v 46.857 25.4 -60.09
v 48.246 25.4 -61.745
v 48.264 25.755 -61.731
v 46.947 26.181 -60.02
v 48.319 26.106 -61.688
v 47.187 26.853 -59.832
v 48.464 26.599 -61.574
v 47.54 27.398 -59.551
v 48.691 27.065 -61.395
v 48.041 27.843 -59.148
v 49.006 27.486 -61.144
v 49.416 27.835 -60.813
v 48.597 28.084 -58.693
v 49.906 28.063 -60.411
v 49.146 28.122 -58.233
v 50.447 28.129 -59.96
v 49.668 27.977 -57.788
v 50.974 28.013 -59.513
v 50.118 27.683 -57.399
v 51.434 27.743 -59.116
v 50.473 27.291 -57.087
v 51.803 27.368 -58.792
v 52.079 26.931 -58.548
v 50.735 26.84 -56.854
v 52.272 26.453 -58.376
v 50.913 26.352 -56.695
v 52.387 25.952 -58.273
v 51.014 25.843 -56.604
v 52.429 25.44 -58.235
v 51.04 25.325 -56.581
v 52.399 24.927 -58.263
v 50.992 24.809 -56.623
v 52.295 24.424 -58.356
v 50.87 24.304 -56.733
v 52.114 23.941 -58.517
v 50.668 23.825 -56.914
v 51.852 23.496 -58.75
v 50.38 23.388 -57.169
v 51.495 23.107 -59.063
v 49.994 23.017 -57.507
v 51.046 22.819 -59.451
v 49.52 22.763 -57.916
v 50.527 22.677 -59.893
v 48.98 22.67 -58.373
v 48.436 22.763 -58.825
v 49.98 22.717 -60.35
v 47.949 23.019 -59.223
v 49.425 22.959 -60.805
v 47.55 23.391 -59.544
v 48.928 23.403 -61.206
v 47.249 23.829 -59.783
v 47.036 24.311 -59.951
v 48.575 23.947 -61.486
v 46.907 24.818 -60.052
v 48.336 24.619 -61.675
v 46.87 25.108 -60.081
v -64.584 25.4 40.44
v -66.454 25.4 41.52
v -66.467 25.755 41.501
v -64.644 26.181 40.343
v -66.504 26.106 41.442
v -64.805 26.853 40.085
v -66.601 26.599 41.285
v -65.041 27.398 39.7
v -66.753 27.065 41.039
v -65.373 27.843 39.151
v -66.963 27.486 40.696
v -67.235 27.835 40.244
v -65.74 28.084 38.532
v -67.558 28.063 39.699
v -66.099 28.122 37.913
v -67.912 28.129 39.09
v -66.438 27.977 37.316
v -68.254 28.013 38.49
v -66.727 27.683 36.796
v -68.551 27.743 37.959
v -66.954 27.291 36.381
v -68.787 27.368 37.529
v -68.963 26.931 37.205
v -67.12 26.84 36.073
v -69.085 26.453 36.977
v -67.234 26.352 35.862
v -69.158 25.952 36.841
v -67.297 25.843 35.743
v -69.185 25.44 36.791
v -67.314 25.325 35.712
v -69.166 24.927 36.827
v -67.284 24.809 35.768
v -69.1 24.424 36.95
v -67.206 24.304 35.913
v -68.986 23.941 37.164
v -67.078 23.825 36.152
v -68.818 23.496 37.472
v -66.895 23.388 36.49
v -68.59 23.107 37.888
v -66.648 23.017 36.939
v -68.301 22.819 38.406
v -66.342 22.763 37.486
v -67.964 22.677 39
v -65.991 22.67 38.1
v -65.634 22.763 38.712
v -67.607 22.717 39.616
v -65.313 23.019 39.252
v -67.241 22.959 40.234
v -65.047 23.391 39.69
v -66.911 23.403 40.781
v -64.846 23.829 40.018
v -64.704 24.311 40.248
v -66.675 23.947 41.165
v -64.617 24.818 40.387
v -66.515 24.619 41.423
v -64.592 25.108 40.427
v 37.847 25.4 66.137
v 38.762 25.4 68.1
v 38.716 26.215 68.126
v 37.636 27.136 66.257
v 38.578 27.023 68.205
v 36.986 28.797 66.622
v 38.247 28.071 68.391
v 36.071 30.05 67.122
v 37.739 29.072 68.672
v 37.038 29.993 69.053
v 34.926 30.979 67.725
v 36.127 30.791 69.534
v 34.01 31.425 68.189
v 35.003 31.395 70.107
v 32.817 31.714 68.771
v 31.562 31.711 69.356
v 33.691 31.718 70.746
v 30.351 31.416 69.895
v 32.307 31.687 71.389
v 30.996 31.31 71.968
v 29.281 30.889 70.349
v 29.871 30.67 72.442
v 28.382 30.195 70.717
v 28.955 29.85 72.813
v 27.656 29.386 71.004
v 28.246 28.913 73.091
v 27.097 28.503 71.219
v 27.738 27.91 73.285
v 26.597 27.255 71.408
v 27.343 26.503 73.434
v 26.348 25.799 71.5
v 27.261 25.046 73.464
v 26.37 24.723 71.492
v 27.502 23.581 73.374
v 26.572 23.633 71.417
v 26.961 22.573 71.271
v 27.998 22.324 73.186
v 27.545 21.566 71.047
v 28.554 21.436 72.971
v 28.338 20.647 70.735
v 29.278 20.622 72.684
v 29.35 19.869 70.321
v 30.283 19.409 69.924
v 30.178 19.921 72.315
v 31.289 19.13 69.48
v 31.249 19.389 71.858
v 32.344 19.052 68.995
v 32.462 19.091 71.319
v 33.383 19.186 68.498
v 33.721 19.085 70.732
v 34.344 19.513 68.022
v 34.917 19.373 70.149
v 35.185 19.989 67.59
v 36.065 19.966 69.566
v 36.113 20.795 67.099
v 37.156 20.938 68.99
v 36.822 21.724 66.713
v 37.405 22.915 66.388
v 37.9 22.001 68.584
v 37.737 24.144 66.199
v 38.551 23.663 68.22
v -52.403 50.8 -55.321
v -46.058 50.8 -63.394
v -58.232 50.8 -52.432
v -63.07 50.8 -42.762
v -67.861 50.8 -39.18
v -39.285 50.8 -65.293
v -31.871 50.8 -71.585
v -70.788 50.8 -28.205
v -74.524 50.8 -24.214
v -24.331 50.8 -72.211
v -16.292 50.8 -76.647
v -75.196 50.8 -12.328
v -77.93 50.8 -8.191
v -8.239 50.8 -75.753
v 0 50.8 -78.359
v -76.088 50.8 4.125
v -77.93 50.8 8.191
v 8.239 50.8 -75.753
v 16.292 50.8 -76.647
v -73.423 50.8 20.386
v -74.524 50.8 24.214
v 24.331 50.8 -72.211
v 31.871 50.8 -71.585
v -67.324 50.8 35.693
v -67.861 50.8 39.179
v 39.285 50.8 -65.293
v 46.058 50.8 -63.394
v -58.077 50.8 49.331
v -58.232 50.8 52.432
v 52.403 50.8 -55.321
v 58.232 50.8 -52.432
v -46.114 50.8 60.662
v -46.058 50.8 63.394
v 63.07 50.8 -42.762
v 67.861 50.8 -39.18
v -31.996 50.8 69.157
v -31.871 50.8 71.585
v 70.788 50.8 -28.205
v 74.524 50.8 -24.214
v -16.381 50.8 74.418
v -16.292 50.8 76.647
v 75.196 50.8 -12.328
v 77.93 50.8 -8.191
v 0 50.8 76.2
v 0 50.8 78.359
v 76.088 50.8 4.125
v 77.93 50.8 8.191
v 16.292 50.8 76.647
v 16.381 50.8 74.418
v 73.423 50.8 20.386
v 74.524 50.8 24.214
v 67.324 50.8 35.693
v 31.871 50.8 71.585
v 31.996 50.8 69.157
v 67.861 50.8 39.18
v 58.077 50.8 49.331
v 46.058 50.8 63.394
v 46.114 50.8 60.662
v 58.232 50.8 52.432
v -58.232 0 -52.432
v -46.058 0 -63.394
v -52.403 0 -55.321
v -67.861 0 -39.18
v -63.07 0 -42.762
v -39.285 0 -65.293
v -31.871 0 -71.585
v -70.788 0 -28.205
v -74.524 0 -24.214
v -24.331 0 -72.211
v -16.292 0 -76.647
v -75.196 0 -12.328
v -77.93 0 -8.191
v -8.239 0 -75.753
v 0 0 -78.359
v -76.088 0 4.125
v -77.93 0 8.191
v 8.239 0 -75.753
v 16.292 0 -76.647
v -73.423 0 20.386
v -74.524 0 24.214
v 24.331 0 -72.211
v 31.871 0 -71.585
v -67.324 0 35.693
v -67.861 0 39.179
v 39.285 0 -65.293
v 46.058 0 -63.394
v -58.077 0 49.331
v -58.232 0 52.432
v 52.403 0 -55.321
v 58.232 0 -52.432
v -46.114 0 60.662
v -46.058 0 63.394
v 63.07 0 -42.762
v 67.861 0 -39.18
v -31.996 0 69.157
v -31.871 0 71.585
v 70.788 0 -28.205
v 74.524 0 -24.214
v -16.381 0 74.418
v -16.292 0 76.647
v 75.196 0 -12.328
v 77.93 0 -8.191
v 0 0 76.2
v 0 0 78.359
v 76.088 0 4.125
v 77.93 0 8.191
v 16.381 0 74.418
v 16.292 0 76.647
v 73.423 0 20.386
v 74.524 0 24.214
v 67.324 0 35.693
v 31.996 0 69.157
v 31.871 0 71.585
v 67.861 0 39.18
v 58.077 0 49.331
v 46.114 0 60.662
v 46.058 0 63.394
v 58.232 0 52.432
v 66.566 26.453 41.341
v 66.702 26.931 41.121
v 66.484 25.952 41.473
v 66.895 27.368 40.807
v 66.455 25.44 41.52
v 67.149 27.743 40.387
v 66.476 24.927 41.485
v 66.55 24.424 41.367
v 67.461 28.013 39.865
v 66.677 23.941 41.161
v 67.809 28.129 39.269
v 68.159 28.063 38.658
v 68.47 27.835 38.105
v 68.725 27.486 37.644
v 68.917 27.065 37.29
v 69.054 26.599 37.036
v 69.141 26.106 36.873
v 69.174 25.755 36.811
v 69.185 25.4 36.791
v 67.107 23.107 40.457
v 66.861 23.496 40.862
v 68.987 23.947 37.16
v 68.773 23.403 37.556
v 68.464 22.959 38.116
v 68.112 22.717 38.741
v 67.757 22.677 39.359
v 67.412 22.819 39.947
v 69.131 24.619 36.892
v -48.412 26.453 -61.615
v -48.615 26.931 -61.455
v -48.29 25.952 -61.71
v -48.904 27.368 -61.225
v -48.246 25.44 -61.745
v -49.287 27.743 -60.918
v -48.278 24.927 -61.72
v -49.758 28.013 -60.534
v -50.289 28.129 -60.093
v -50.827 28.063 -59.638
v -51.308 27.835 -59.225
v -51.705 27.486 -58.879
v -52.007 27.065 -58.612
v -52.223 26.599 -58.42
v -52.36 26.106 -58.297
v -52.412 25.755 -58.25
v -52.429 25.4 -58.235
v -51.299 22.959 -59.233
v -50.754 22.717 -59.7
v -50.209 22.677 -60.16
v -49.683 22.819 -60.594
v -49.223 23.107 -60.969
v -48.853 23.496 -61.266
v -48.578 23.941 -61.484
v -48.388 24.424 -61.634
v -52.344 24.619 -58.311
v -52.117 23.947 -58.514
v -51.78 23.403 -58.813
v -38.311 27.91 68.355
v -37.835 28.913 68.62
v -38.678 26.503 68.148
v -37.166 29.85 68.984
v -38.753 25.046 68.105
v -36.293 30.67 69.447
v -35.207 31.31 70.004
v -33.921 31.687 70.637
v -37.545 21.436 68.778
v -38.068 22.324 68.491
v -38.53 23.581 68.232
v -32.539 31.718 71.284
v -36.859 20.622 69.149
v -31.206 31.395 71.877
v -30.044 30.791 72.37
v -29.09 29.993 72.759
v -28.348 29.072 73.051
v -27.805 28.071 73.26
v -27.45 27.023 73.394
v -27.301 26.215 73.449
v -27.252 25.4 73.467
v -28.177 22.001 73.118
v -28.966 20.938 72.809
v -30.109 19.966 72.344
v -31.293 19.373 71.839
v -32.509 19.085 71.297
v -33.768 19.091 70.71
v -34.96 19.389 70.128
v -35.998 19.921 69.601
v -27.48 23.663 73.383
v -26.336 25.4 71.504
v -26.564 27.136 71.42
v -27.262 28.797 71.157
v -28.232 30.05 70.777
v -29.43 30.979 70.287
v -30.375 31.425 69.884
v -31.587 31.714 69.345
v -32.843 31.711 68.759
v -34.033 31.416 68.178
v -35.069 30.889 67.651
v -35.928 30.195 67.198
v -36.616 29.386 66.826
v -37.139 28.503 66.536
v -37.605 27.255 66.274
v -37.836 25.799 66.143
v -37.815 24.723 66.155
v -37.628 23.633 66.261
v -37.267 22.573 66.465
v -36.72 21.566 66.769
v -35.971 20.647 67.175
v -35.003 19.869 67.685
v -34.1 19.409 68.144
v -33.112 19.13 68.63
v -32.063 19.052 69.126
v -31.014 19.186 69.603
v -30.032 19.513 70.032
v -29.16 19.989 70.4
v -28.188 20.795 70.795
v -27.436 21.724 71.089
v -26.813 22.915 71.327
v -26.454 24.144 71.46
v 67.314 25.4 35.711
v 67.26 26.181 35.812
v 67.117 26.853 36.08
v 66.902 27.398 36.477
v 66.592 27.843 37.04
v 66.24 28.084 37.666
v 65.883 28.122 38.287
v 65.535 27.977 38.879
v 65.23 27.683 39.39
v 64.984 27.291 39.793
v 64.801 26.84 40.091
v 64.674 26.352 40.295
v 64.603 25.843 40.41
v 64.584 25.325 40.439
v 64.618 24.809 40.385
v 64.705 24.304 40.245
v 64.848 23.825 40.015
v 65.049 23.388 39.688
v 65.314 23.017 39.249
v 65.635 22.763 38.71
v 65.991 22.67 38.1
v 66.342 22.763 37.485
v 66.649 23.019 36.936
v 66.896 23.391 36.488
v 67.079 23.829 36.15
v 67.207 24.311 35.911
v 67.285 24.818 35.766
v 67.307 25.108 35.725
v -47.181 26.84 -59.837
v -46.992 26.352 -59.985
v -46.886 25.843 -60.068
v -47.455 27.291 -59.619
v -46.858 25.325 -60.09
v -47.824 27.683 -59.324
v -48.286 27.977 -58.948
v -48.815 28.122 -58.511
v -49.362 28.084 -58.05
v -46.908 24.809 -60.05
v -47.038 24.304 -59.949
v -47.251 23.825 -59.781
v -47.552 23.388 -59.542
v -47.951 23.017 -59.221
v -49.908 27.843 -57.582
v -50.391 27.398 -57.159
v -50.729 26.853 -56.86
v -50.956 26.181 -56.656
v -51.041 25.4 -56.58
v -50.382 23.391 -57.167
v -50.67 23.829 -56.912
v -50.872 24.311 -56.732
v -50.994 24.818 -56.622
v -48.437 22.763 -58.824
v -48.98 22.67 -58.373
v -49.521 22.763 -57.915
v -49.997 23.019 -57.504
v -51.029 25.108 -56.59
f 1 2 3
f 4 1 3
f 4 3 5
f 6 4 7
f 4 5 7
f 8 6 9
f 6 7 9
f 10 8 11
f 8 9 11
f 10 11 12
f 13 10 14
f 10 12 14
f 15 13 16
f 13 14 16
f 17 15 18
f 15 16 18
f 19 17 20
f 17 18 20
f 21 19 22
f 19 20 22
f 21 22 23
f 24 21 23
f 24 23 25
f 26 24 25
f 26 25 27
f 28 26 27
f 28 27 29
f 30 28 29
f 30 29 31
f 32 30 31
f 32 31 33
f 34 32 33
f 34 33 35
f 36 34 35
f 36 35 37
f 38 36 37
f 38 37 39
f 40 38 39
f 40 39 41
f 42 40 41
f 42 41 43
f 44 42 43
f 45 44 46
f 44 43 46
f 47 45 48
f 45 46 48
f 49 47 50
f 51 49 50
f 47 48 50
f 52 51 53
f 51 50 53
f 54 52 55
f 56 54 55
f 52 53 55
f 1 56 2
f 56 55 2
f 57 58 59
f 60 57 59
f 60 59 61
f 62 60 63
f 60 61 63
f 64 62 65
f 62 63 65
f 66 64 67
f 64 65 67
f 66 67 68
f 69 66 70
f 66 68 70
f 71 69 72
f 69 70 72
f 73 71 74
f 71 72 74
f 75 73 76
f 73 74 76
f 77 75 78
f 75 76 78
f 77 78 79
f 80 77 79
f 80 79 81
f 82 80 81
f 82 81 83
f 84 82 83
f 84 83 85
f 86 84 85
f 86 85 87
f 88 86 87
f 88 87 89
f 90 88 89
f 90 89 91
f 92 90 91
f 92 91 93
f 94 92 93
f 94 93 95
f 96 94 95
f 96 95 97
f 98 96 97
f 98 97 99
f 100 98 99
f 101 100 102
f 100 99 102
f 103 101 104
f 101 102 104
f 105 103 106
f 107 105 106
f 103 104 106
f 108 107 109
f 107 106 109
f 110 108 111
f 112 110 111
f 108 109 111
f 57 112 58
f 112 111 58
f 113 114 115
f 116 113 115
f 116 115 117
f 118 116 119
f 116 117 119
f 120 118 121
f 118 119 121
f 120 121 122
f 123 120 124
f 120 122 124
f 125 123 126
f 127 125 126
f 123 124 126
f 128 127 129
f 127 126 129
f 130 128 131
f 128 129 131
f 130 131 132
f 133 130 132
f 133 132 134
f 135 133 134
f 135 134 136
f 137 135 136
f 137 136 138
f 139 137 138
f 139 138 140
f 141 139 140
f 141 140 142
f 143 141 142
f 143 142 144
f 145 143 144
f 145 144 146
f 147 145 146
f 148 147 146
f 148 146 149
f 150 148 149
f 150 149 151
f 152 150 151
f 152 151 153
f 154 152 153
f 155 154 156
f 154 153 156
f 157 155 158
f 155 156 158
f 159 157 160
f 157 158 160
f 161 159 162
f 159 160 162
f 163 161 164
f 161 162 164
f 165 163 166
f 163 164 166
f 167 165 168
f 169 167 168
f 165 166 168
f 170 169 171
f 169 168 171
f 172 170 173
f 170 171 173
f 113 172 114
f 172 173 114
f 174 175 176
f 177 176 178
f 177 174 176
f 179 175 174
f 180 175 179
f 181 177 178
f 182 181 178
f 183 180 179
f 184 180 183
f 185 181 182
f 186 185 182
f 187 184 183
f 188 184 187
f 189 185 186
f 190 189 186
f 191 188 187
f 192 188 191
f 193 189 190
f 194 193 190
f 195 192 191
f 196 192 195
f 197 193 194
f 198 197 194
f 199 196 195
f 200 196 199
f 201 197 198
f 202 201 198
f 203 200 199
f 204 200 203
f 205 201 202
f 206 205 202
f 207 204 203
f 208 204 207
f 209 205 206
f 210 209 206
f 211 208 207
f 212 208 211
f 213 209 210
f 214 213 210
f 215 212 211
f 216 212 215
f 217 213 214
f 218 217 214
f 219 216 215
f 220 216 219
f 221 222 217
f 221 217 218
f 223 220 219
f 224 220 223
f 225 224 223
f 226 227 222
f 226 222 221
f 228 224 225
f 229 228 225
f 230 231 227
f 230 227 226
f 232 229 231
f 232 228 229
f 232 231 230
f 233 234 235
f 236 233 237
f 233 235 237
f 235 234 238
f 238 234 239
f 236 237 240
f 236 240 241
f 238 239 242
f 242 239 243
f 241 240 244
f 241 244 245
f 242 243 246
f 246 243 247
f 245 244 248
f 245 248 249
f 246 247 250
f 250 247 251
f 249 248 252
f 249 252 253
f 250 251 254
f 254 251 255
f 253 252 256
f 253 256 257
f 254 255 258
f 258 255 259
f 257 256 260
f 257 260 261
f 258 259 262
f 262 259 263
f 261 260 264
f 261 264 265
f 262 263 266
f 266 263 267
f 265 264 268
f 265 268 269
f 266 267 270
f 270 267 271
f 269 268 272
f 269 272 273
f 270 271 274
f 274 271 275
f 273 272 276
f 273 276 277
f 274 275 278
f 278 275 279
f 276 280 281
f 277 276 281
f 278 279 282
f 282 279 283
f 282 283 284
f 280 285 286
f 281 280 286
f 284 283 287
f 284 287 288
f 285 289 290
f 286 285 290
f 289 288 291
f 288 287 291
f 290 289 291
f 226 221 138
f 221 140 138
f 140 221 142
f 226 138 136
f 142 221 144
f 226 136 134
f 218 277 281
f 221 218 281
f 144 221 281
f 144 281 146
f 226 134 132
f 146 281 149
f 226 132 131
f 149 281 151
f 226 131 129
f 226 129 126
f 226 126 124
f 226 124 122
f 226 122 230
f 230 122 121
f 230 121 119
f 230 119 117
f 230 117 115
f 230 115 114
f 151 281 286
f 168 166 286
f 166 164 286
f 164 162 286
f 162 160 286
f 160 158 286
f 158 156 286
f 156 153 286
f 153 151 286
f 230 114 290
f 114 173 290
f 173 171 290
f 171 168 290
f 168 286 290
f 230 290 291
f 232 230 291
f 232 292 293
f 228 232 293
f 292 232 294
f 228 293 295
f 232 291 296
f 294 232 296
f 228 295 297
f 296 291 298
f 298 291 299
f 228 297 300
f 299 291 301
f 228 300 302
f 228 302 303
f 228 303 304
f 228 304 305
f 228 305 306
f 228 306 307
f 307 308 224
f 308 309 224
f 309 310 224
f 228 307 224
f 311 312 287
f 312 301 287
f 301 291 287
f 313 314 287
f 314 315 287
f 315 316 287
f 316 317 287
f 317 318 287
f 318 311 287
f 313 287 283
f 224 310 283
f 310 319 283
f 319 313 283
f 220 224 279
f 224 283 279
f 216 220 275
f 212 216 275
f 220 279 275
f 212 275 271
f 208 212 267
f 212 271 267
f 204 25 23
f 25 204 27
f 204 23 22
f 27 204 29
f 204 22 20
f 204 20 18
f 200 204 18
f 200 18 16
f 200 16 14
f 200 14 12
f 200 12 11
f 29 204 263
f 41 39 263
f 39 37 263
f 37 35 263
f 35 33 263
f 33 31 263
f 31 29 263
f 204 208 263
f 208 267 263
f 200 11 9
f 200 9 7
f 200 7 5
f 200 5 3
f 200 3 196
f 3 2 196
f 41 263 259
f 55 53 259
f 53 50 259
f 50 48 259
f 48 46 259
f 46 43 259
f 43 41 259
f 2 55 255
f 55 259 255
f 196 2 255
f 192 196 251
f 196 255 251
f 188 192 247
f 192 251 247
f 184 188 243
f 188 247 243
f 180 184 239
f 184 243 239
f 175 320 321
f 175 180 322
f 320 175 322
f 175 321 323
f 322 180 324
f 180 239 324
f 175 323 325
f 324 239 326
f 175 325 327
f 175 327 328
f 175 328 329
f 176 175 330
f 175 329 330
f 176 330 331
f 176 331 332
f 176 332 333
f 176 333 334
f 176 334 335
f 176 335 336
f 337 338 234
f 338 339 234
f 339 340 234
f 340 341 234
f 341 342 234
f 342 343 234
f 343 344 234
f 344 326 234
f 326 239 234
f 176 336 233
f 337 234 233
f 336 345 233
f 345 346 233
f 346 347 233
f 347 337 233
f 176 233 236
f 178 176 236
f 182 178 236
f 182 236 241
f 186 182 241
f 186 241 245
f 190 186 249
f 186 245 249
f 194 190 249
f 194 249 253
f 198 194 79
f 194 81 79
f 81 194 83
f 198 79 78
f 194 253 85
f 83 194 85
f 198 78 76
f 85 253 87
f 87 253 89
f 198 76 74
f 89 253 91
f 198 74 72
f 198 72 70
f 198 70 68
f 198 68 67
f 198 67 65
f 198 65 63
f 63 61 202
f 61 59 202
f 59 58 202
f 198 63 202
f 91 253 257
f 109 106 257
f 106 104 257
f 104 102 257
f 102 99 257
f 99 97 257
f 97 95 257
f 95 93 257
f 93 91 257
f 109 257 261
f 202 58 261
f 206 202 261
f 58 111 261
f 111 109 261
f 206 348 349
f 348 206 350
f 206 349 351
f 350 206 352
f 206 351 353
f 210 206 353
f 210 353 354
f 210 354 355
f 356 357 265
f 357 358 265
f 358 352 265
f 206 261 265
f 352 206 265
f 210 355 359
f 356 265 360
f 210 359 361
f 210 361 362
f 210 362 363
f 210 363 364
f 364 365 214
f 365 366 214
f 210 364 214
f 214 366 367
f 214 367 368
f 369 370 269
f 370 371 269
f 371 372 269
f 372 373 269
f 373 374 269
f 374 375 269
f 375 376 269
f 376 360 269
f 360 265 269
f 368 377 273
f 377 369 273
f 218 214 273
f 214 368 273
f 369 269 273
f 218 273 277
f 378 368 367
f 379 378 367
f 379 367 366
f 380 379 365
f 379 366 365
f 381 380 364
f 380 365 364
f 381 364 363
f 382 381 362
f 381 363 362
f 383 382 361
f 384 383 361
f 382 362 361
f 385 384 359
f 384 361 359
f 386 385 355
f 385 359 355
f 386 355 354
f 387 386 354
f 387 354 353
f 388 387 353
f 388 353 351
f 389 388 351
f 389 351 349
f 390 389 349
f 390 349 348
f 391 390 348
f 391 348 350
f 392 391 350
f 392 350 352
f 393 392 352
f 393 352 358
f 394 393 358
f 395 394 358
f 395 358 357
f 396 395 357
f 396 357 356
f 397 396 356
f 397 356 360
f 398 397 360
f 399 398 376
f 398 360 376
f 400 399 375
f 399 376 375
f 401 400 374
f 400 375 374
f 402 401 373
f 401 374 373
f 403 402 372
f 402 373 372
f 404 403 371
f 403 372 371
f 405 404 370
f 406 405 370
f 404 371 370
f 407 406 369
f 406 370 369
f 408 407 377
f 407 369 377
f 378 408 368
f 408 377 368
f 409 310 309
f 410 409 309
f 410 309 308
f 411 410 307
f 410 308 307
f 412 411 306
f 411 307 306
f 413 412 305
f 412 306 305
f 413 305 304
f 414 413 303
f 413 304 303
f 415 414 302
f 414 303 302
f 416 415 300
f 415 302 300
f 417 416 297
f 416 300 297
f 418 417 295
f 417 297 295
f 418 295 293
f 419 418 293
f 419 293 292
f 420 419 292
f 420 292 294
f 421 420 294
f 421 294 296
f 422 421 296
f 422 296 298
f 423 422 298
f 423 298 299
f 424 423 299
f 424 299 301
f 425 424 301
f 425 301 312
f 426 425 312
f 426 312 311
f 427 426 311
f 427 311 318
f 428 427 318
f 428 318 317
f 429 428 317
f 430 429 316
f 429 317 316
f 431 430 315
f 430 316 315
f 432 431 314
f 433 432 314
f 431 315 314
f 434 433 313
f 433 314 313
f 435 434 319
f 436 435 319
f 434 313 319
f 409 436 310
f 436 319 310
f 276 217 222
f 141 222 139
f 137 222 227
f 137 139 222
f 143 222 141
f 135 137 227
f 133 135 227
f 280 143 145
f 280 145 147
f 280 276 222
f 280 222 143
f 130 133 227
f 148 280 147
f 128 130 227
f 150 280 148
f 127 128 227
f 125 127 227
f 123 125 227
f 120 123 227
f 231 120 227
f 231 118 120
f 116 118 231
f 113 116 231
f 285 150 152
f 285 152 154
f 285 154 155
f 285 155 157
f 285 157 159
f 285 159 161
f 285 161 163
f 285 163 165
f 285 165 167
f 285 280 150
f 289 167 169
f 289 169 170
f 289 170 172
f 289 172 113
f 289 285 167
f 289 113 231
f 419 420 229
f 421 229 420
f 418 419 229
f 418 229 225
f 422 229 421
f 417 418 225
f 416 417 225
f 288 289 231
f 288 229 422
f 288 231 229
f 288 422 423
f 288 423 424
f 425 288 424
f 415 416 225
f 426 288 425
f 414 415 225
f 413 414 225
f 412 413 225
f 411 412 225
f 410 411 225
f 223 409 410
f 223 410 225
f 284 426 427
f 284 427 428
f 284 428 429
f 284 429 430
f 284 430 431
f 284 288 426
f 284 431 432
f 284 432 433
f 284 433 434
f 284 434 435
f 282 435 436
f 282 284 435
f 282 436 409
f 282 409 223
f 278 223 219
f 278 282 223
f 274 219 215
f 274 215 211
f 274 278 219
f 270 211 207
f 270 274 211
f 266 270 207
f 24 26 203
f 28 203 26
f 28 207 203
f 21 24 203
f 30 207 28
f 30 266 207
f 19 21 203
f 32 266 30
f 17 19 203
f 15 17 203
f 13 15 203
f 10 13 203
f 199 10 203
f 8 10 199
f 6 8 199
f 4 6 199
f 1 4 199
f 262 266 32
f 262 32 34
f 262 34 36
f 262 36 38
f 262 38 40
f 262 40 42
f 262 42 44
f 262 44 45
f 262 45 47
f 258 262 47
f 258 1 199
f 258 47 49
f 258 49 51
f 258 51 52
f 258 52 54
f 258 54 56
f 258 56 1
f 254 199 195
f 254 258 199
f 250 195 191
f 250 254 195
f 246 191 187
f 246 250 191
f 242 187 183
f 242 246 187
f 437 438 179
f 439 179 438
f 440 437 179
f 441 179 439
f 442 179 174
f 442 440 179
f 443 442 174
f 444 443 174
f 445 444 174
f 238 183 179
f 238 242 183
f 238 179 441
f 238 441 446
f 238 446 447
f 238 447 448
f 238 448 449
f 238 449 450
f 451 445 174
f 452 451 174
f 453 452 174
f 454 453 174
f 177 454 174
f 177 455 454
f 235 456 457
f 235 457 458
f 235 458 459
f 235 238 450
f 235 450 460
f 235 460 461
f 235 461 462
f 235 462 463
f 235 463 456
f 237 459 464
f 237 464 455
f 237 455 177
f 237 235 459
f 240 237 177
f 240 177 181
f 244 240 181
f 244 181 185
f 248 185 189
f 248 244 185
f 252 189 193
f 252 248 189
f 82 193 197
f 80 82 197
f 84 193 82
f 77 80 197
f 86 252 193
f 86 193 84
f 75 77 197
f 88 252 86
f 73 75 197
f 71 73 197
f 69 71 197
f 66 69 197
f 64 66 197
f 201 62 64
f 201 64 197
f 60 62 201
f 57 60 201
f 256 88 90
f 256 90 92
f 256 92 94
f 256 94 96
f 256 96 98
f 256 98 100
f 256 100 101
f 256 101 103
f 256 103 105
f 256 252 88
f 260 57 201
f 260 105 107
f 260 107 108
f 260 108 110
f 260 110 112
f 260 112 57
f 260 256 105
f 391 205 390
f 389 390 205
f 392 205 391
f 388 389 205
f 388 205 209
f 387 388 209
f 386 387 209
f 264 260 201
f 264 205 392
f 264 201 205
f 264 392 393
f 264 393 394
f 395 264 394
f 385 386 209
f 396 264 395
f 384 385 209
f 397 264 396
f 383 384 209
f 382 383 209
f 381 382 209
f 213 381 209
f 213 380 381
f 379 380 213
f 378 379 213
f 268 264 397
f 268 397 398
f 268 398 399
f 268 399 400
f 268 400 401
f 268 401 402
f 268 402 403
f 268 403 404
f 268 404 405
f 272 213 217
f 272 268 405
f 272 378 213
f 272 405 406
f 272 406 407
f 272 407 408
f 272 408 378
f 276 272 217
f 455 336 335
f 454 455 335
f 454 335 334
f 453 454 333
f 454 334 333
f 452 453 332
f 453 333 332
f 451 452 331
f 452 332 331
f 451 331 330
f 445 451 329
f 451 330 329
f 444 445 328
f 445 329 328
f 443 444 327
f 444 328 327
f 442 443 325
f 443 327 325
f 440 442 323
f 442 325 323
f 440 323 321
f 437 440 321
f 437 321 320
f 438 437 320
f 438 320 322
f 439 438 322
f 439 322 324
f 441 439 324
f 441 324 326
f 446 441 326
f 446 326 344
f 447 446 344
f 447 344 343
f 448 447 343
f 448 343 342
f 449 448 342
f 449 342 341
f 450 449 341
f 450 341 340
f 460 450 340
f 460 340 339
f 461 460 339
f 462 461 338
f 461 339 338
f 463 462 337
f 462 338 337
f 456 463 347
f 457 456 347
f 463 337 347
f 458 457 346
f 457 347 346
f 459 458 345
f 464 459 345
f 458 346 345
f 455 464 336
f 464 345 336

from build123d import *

# Parameters (mm, degrees)
SKETCH1_R           = 78.359
SKETCH1_R_2         = 76.2
BOSS_EXTRUDE1_DEPTH = 50.8
SKETCH4_R           = 6.35
CUT_EXTRUDE1_DEPTH  = 25.4
SKETCH5_R           = 6.35
CUT_EXTRUDE2_DEPTH  = 25.4
SKETCH6_R           = 2.7305
CUT_EXTRUDE3_DEPTH  = 2.54
CIRPATTERN1_COUNT   = 4
CIRPATTERN1_ANGLE   = 240


with BuildPart() as part:
    # Sketch1 → Boss-Extrude1 (new body)
    with BuildSketch(Plane(origin=(0, 0, 0), x_dir=(1, 0, 0), z_dir=(0, 1, 0))):
        with Locations(Location((0, 0, 0), (0, 0, 270))):
            Circle(SKETCH1_R)
        with Locations(Location((0, 0, 0), (0, 0, 270))):
            Circle(SKETCH1_R_2, mode=Mode.SUBTRACT)
    extrude(amount=BOSS_EXTRUDE1_DEPTH)

    # Sketch4 → Cut-Extrude1 (cut)
    with BuildSketch(Plane(origin=(33.115944372, 0, 71.017371884), x_dir=(0, -1, 0), z_dir=(0.4226182617407003, 0, 0.9063077870366496))):
        with Locations(Location((-25.4, 0, 0), (0, 0, 90))):
            Circle(SKETCH4_R)
    extrude(amount=-CUT_EXTRUDE1_DEPTH, mode=Mode.SUBTRACT)

    # Sketch5 → Cut-Extrude2 (cut)
    with BuildSketch(Plane(origin=(-33.115944372, 0, 71.017371884), x_dir=(0, -1, 0), z_dir=(-0.4226182617407003, 0, 0.9063077870366496))):
        with Locations(Location((-25.4, 0, 0), (0, 0, 90))):
            Circle(SKETCH5_R)
    extrude(amount=-CUT_EXTRUDE2_DEPTH, mode=Mode.SUBTRACT)

    # Sketch6 → Cut-Extrude3 (cut)
    with BuildSketch(Plane(origin=(67.860884615, 0, 39.1795), x_dir=(0, -1, 0), z_dir=(0.8660254037844416, 0, 0.49999999999999495))):
        with Locations(Location((-25.4, 0, 0), (0, 0, 90))):
            Circle(SKETCH6_R)
    cut_extrude3 = extrude(amount=-CUT_EXTRUDE3_DEPTH, mode=Mode.SUBTRACT)

    # CirPattern1: Cut-Extrude3 ×4 about axis
    cirpattern1_axis = Axis((0, 50.8, 0), (0, 1, 0))
    for i in range(1, CIRPATTERN1_COUNT):
        add(cut_extrude3.rotate(cirpattern1_axis, i * CIRPATTERN1_ANGLE / (CIRPATTERN1_COUNT - 1)), mode=Mode.SUBTRACT)


solid = part.part
